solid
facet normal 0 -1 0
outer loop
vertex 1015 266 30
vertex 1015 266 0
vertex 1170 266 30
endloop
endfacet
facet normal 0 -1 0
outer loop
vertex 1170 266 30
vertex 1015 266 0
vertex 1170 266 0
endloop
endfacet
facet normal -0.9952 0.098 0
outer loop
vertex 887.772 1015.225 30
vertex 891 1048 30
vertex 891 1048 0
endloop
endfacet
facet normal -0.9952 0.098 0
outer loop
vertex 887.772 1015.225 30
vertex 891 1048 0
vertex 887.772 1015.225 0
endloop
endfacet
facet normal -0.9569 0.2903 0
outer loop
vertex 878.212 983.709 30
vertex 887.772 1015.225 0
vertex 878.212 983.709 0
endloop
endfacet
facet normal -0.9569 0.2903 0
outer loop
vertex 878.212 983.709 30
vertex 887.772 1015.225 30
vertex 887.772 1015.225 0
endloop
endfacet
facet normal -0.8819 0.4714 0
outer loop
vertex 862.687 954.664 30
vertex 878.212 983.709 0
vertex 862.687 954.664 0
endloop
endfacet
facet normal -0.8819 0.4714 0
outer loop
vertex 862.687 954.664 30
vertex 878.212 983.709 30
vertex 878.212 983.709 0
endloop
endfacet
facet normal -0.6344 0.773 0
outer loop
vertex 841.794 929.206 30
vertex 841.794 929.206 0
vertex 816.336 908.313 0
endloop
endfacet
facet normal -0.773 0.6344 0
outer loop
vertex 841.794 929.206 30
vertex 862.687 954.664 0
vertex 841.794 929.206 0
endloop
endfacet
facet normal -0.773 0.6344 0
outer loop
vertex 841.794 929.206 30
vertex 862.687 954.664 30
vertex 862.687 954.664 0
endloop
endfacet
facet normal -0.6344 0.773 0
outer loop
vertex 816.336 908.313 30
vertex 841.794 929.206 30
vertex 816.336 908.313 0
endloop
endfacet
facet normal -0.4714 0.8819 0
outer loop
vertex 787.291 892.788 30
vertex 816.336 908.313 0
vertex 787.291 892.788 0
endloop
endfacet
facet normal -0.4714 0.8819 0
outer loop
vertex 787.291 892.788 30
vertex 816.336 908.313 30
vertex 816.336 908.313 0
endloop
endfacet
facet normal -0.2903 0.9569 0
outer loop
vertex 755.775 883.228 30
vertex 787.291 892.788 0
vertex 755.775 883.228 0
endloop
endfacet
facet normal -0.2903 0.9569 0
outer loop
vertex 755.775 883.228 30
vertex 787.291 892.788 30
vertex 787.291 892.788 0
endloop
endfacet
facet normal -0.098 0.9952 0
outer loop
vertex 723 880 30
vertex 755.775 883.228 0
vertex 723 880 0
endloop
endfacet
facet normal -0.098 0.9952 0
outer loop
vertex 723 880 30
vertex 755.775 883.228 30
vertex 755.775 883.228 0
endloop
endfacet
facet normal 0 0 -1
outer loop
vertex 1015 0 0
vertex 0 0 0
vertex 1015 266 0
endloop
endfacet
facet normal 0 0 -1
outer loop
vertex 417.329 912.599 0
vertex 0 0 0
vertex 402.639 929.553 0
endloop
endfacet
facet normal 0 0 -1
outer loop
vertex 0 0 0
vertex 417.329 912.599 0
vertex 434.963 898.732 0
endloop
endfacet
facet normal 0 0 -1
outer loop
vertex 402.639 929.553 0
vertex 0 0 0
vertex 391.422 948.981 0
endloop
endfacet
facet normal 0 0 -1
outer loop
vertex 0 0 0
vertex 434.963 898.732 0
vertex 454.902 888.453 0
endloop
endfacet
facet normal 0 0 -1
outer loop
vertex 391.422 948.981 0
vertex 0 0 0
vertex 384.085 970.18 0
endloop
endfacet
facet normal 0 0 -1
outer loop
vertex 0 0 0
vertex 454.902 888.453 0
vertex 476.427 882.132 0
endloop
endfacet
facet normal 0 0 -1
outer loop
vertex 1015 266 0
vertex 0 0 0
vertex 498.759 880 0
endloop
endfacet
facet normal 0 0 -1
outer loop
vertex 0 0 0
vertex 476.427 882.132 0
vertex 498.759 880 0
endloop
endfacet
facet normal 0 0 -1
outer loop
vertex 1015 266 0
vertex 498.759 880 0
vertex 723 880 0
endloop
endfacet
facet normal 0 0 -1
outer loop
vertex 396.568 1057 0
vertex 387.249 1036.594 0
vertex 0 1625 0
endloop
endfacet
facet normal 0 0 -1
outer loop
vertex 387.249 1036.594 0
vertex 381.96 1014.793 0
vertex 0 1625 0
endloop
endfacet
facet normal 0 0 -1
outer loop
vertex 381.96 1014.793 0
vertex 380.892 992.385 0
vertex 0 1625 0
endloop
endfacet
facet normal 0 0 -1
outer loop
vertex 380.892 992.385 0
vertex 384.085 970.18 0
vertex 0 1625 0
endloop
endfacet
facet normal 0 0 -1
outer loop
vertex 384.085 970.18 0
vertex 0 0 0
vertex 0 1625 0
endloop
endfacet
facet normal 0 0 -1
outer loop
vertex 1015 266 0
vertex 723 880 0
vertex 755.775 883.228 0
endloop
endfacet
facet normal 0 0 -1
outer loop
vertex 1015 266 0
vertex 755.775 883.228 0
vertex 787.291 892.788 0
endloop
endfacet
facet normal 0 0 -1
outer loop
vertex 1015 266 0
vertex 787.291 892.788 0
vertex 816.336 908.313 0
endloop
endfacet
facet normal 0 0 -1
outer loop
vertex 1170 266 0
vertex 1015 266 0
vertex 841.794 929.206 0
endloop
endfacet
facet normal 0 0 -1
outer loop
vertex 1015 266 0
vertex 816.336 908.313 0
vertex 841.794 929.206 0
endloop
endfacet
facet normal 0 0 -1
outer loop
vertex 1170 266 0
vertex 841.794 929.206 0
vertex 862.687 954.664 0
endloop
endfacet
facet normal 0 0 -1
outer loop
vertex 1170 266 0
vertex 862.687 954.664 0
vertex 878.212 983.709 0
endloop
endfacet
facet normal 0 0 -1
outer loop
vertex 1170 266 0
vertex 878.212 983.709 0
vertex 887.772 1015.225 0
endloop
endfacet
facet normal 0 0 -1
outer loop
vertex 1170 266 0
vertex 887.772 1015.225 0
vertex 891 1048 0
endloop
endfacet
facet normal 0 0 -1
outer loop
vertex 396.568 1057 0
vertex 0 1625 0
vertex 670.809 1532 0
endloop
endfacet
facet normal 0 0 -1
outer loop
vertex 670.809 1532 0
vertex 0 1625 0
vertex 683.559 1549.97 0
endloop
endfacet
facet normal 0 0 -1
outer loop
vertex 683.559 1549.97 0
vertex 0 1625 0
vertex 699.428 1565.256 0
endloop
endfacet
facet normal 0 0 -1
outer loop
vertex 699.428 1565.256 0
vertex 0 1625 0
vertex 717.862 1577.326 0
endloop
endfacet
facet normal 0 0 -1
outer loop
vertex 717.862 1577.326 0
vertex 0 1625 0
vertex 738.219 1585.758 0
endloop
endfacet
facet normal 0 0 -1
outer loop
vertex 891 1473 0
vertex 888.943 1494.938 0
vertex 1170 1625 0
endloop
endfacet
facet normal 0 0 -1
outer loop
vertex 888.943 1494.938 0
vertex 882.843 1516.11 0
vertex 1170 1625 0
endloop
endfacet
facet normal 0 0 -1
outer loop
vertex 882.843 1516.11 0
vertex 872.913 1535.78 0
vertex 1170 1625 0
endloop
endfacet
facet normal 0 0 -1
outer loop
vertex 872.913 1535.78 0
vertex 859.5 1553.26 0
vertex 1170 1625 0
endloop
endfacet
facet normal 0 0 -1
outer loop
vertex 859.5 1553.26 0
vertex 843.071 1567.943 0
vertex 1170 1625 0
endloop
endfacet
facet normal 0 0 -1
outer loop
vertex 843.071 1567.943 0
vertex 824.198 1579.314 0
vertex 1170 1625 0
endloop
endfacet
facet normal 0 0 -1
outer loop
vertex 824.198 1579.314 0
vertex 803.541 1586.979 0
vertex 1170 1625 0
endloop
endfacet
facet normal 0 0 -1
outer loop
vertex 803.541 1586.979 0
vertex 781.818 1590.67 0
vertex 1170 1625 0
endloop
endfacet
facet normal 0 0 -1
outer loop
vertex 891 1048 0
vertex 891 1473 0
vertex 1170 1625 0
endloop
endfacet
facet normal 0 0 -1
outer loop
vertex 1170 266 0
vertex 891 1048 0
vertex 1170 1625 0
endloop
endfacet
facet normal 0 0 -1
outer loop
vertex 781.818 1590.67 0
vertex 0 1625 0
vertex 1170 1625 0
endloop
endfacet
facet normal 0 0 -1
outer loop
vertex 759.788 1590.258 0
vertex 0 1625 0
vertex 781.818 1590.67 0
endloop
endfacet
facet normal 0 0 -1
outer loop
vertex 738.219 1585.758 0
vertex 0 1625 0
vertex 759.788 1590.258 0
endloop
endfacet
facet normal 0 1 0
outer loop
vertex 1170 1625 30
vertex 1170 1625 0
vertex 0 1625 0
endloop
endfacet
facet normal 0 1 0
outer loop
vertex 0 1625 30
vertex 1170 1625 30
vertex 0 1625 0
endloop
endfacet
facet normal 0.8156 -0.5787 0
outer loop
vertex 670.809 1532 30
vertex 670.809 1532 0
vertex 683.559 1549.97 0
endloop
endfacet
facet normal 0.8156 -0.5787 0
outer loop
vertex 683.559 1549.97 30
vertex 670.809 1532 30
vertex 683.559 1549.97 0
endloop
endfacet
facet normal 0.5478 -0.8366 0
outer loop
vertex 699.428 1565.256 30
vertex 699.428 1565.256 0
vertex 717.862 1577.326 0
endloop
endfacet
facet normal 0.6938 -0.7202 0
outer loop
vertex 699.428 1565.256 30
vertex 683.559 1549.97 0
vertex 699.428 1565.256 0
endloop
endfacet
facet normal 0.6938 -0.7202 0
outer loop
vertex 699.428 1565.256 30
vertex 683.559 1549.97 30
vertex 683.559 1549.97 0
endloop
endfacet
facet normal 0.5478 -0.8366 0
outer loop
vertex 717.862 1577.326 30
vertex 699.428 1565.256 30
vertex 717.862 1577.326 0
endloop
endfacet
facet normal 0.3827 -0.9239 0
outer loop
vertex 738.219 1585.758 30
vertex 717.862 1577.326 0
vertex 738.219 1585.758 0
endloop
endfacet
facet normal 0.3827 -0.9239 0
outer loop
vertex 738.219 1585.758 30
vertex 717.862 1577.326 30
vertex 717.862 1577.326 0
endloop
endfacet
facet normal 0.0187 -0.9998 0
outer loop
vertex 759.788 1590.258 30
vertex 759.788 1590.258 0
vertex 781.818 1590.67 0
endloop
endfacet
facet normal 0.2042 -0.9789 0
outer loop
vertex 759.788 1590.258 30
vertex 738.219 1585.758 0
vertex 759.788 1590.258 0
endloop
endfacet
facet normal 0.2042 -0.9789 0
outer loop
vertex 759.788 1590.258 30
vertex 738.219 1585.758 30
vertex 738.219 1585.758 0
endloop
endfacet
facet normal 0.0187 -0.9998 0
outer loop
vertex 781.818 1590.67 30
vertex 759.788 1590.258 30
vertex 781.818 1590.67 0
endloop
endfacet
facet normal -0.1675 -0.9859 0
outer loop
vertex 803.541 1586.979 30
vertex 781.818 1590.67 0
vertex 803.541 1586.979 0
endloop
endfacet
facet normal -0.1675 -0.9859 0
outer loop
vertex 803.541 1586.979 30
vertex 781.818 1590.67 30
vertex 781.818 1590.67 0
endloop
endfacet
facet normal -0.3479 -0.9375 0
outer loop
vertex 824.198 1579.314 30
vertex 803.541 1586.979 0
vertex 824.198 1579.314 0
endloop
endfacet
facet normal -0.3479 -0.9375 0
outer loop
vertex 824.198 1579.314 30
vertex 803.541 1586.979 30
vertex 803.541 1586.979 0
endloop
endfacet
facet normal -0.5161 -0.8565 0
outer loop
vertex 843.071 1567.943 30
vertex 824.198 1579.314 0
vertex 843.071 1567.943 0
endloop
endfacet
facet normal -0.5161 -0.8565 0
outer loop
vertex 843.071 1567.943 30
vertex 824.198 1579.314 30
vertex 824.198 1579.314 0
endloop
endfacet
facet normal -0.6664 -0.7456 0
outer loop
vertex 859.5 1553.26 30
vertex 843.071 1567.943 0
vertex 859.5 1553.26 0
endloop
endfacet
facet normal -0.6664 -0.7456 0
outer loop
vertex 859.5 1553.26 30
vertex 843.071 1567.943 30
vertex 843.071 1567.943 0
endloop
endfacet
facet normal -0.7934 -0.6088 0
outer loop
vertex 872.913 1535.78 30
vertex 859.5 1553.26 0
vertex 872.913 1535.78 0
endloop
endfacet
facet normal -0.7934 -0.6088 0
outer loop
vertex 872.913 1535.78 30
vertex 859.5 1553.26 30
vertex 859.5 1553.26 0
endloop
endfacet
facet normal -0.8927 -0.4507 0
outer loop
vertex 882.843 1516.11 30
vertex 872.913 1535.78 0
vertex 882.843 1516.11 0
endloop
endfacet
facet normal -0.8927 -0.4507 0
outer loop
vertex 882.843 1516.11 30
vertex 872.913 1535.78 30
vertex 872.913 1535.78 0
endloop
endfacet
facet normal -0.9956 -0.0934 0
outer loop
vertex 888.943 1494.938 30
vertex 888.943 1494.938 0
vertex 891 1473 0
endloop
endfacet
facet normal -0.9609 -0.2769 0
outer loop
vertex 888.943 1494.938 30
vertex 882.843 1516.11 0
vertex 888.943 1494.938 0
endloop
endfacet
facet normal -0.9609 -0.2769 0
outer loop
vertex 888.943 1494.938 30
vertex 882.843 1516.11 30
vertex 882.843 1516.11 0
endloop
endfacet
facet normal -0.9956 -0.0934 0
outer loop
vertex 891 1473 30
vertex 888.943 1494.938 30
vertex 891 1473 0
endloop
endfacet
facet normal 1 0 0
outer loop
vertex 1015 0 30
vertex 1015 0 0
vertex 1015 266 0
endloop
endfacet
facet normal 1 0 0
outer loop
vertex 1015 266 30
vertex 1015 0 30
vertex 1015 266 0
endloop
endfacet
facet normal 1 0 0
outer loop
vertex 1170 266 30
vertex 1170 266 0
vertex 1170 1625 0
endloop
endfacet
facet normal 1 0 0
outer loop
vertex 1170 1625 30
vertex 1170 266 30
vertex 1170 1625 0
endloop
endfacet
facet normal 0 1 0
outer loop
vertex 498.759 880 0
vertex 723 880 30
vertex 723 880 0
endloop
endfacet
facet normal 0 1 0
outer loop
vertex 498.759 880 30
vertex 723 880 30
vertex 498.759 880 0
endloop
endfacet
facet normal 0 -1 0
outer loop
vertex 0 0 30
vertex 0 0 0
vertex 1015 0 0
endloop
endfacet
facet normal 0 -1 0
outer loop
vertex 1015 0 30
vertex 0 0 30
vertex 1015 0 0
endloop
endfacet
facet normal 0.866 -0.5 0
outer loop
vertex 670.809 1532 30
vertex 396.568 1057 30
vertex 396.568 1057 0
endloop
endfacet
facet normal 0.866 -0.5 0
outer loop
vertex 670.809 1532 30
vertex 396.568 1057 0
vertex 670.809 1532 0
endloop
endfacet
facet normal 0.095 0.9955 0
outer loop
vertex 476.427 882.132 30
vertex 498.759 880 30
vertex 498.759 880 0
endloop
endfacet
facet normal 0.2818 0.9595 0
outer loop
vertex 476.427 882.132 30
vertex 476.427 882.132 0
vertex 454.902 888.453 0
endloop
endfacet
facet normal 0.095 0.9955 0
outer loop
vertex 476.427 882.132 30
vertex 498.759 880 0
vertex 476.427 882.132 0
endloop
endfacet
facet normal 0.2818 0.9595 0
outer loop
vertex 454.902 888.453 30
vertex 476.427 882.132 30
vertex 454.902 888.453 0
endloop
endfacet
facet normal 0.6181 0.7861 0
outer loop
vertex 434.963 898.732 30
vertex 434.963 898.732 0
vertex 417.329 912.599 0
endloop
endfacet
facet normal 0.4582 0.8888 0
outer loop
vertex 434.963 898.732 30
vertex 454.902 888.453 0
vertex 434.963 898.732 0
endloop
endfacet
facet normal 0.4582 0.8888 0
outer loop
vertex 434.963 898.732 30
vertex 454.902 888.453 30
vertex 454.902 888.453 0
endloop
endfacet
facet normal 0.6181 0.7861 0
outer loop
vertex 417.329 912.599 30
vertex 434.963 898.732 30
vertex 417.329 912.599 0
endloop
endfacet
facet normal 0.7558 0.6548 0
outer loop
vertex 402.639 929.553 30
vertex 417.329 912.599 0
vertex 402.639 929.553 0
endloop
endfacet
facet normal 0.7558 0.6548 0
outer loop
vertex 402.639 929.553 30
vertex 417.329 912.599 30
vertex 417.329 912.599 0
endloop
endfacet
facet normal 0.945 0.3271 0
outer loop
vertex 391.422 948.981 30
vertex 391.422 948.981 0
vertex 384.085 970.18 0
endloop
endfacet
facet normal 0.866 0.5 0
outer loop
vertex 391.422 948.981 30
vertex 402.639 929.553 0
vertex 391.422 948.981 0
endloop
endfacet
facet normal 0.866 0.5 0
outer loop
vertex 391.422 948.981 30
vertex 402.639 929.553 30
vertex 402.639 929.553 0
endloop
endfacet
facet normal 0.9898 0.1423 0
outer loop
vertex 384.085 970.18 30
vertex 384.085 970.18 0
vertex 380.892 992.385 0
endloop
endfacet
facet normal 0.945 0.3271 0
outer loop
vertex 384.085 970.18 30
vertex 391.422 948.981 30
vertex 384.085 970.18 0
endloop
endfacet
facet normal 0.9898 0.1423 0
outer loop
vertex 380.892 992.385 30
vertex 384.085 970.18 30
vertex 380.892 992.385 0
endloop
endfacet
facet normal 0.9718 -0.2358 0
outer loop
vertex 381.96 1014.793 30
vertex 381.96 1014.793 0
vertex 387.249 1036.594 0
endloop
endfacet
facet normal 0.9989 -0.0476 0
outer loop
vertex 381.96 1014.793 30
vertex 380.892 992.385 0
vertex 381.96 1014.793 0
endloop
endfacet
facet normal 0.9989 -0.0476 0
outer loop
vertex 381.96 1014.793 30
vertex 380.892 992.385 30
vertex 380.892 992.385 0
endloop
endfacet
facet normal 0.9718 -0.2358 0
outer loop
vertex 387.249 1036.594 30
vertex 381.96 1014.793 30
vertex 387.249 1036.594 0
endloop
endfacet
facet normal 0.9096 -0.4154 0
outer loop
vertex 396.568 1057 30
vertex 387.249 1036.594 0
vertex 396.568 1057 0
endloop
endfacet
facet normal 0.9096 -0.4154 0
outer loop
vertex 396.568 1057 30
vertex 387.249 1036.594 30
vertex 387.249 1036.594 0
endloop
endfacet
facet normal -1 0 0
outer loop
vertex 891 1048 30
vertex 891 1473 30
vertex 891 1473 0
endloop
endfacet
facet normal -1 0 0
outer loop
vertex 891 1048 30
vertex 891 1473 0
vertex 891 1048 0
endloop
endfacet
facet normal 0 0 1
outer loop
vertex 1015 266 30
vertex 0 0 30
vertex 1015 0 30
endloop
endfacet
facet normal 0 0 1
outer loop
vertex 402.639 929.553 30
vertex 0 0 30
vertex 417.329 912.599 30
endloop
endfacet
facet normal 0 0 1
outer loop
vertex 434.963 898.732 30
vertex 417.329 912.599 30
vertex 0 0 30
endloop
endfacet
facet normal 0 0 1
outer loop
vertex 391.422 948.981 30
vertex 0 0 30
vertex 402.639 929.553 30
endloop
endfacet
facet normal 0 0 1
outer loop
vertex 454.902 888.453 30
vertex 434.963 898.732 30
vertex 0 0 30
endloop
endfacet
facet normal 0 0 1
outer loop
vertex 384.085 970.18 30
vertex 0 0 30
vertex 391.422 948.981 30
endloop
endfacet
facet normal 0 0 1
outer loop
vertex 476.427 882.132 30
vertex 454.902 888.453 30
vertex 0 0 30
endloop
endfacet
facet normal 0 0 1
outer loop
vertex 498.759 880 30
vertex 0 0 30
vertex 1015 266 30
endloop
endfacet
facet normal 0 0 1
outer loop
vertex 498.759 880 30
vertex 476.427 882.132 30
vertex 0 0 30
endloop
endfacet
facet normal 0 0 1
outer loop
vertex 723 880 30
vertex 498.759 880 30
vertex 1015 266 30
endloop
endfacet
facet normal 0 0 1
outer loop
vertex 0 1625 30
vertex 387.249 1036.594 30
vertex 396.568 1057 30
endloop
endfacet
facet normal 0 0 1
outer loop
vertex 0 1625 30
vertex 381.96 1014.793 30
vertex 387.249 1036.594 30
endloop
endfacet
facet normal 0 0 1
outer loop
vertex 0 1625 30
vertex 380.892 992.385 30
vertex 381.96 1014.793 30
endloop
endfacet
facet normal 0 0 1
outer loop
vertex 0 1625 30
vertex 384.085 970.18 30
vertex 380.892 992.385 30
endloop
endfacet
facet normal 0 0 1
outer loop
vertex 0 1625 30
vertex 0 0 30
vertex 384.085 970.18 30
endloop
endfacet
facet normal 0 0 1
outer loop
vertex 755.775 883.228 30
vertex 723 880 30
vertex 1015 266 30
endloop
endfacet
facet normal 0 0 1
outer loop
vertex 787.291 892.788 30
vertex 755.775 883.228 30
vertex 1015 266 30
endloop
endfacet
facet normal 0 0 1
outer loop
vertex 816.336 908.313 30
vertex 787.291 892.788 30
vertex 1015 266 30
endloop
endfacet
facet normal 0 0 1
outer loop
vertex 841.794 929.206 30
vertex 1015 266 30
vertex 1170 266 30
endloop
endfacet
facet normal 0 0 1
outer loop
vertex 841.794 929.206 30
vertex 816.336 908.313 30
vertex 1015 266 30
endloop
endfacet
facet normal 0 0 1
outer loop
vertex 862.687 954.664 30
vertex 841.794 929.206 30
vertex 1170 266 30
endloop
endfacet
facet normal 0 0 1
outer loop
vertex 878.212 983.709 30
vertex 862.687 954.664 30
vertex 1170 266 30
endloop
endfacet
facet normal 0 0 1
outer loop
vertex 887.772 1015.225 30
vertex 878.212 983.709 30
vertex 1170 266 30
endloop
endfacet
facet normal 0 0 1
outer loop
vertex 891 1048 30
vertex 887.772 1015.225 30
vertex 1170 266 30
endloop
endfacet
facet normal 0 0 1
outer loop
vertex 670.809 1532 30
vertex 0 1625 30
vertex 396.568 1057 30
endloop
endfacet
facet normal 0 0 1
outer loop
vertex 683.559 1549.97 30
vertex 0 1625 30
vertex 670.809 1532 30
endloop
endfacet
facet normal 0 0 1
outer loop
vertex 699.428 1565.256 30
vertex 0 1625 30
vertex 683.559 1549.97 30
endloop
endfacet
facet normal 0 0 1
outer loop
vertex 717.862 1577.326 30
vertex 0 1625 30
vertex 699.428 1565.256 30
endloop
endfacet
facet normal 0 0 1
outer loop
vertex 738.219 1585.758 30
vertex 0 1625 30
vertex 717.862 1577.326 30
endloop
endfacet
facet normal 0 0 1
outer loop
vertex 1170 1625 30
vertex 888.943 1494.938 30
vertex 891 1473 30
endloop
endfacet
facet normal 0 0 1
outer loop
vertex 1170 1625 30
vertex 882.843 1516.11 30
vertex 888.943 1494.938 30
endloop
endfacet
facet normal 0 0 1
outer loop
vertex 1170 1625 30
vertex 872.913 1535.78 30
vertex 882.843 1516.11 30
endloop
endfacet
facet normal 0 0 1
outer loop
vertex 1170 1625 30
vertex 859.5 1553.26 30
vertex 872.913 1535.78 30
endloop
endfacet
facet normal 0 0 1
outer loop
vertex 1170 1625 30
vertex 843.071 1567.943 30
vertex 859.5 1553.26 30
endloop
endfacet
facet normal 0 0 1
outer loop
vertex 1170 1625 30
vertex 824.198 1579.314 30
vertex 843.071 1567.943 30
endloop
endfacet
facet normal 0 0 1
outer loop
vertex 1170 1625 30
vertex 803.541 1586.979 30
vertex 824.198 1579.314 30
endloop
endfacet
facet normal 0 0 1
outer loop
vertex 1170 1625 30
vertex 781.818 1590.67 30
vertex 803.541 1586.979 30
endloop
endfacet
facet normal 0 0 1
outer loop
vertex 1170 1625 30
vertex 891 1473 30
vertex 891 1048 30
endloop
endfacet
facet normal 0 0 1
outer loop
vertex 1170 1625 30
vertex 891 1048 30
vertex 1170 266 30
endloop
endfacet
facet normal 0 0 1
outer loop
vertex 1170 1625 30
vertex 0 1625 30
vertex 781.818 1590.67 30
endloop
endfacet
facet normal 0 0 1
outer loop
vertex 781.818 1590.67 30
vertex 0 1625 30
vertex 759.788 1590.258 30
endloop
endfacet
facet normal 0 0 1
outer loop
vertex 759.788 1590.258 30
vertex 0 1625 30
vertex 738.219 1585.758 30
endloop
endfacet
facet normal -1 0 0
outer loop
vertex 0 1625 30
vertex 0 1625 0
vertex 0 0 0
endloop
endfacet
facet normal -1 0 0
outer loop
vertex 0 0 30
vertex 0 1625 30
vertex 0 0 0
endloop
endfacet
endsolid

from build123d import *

# Parameters (mm, degrees)
BOSS_EXTRUDE1_DEPTH = 30
CUT_EXTRUDE1_DEPTH  = 2109.570619983


with BuildPart() as part:
    # Sketch1 → Boss-Extrude1 (new body)
    with BuildSketch(Plane.XY):
        Polygon((0, 0), (1015, 0), (1015, 266), (1170, 266), (1170, 1625), (0, 1625), align=None)
    extrude(amount=BOSS_EXTRUDE1_DEPTH)

    # Sketch2 → Cut-Extrude1 (cut, through all)
    with BuildSketch(Plane(origin=(-119.436638294, -43.071405931, 31), x_dir=(1, 0, 0), z_dir=(0, 0, 1))):
        with BuildLine():
            Line((1010.436638294, 1516.071405931), (1010.436638294, 1091.071405931))
            ThreePointArc((1010.436638294, 1091.071405931), (961.230577533, 972.277466691), (842.436638294, 923.071405931))
            Line((842.436638294, 923.071405931), (618.195260429, 923.071405931))
            ThreePointArc((618.195260429, 923.071405931), (516.004262782, 982.071405931), (516.004262782, 1100.071405931))
            Line((516.004262782, 1100.071405931), (790.245640647, 1575.071405931))
            ThreePointArc((790.245640647, 1575.071405931), (922.977285616, 1630.050653433), (1010.436638294, 1516.071405931))
        make_face()
    extrude(amount=-CUT_EXTRUDE1_DEPTH, mode=Mode.SUBTRACT)


solid = part.part
